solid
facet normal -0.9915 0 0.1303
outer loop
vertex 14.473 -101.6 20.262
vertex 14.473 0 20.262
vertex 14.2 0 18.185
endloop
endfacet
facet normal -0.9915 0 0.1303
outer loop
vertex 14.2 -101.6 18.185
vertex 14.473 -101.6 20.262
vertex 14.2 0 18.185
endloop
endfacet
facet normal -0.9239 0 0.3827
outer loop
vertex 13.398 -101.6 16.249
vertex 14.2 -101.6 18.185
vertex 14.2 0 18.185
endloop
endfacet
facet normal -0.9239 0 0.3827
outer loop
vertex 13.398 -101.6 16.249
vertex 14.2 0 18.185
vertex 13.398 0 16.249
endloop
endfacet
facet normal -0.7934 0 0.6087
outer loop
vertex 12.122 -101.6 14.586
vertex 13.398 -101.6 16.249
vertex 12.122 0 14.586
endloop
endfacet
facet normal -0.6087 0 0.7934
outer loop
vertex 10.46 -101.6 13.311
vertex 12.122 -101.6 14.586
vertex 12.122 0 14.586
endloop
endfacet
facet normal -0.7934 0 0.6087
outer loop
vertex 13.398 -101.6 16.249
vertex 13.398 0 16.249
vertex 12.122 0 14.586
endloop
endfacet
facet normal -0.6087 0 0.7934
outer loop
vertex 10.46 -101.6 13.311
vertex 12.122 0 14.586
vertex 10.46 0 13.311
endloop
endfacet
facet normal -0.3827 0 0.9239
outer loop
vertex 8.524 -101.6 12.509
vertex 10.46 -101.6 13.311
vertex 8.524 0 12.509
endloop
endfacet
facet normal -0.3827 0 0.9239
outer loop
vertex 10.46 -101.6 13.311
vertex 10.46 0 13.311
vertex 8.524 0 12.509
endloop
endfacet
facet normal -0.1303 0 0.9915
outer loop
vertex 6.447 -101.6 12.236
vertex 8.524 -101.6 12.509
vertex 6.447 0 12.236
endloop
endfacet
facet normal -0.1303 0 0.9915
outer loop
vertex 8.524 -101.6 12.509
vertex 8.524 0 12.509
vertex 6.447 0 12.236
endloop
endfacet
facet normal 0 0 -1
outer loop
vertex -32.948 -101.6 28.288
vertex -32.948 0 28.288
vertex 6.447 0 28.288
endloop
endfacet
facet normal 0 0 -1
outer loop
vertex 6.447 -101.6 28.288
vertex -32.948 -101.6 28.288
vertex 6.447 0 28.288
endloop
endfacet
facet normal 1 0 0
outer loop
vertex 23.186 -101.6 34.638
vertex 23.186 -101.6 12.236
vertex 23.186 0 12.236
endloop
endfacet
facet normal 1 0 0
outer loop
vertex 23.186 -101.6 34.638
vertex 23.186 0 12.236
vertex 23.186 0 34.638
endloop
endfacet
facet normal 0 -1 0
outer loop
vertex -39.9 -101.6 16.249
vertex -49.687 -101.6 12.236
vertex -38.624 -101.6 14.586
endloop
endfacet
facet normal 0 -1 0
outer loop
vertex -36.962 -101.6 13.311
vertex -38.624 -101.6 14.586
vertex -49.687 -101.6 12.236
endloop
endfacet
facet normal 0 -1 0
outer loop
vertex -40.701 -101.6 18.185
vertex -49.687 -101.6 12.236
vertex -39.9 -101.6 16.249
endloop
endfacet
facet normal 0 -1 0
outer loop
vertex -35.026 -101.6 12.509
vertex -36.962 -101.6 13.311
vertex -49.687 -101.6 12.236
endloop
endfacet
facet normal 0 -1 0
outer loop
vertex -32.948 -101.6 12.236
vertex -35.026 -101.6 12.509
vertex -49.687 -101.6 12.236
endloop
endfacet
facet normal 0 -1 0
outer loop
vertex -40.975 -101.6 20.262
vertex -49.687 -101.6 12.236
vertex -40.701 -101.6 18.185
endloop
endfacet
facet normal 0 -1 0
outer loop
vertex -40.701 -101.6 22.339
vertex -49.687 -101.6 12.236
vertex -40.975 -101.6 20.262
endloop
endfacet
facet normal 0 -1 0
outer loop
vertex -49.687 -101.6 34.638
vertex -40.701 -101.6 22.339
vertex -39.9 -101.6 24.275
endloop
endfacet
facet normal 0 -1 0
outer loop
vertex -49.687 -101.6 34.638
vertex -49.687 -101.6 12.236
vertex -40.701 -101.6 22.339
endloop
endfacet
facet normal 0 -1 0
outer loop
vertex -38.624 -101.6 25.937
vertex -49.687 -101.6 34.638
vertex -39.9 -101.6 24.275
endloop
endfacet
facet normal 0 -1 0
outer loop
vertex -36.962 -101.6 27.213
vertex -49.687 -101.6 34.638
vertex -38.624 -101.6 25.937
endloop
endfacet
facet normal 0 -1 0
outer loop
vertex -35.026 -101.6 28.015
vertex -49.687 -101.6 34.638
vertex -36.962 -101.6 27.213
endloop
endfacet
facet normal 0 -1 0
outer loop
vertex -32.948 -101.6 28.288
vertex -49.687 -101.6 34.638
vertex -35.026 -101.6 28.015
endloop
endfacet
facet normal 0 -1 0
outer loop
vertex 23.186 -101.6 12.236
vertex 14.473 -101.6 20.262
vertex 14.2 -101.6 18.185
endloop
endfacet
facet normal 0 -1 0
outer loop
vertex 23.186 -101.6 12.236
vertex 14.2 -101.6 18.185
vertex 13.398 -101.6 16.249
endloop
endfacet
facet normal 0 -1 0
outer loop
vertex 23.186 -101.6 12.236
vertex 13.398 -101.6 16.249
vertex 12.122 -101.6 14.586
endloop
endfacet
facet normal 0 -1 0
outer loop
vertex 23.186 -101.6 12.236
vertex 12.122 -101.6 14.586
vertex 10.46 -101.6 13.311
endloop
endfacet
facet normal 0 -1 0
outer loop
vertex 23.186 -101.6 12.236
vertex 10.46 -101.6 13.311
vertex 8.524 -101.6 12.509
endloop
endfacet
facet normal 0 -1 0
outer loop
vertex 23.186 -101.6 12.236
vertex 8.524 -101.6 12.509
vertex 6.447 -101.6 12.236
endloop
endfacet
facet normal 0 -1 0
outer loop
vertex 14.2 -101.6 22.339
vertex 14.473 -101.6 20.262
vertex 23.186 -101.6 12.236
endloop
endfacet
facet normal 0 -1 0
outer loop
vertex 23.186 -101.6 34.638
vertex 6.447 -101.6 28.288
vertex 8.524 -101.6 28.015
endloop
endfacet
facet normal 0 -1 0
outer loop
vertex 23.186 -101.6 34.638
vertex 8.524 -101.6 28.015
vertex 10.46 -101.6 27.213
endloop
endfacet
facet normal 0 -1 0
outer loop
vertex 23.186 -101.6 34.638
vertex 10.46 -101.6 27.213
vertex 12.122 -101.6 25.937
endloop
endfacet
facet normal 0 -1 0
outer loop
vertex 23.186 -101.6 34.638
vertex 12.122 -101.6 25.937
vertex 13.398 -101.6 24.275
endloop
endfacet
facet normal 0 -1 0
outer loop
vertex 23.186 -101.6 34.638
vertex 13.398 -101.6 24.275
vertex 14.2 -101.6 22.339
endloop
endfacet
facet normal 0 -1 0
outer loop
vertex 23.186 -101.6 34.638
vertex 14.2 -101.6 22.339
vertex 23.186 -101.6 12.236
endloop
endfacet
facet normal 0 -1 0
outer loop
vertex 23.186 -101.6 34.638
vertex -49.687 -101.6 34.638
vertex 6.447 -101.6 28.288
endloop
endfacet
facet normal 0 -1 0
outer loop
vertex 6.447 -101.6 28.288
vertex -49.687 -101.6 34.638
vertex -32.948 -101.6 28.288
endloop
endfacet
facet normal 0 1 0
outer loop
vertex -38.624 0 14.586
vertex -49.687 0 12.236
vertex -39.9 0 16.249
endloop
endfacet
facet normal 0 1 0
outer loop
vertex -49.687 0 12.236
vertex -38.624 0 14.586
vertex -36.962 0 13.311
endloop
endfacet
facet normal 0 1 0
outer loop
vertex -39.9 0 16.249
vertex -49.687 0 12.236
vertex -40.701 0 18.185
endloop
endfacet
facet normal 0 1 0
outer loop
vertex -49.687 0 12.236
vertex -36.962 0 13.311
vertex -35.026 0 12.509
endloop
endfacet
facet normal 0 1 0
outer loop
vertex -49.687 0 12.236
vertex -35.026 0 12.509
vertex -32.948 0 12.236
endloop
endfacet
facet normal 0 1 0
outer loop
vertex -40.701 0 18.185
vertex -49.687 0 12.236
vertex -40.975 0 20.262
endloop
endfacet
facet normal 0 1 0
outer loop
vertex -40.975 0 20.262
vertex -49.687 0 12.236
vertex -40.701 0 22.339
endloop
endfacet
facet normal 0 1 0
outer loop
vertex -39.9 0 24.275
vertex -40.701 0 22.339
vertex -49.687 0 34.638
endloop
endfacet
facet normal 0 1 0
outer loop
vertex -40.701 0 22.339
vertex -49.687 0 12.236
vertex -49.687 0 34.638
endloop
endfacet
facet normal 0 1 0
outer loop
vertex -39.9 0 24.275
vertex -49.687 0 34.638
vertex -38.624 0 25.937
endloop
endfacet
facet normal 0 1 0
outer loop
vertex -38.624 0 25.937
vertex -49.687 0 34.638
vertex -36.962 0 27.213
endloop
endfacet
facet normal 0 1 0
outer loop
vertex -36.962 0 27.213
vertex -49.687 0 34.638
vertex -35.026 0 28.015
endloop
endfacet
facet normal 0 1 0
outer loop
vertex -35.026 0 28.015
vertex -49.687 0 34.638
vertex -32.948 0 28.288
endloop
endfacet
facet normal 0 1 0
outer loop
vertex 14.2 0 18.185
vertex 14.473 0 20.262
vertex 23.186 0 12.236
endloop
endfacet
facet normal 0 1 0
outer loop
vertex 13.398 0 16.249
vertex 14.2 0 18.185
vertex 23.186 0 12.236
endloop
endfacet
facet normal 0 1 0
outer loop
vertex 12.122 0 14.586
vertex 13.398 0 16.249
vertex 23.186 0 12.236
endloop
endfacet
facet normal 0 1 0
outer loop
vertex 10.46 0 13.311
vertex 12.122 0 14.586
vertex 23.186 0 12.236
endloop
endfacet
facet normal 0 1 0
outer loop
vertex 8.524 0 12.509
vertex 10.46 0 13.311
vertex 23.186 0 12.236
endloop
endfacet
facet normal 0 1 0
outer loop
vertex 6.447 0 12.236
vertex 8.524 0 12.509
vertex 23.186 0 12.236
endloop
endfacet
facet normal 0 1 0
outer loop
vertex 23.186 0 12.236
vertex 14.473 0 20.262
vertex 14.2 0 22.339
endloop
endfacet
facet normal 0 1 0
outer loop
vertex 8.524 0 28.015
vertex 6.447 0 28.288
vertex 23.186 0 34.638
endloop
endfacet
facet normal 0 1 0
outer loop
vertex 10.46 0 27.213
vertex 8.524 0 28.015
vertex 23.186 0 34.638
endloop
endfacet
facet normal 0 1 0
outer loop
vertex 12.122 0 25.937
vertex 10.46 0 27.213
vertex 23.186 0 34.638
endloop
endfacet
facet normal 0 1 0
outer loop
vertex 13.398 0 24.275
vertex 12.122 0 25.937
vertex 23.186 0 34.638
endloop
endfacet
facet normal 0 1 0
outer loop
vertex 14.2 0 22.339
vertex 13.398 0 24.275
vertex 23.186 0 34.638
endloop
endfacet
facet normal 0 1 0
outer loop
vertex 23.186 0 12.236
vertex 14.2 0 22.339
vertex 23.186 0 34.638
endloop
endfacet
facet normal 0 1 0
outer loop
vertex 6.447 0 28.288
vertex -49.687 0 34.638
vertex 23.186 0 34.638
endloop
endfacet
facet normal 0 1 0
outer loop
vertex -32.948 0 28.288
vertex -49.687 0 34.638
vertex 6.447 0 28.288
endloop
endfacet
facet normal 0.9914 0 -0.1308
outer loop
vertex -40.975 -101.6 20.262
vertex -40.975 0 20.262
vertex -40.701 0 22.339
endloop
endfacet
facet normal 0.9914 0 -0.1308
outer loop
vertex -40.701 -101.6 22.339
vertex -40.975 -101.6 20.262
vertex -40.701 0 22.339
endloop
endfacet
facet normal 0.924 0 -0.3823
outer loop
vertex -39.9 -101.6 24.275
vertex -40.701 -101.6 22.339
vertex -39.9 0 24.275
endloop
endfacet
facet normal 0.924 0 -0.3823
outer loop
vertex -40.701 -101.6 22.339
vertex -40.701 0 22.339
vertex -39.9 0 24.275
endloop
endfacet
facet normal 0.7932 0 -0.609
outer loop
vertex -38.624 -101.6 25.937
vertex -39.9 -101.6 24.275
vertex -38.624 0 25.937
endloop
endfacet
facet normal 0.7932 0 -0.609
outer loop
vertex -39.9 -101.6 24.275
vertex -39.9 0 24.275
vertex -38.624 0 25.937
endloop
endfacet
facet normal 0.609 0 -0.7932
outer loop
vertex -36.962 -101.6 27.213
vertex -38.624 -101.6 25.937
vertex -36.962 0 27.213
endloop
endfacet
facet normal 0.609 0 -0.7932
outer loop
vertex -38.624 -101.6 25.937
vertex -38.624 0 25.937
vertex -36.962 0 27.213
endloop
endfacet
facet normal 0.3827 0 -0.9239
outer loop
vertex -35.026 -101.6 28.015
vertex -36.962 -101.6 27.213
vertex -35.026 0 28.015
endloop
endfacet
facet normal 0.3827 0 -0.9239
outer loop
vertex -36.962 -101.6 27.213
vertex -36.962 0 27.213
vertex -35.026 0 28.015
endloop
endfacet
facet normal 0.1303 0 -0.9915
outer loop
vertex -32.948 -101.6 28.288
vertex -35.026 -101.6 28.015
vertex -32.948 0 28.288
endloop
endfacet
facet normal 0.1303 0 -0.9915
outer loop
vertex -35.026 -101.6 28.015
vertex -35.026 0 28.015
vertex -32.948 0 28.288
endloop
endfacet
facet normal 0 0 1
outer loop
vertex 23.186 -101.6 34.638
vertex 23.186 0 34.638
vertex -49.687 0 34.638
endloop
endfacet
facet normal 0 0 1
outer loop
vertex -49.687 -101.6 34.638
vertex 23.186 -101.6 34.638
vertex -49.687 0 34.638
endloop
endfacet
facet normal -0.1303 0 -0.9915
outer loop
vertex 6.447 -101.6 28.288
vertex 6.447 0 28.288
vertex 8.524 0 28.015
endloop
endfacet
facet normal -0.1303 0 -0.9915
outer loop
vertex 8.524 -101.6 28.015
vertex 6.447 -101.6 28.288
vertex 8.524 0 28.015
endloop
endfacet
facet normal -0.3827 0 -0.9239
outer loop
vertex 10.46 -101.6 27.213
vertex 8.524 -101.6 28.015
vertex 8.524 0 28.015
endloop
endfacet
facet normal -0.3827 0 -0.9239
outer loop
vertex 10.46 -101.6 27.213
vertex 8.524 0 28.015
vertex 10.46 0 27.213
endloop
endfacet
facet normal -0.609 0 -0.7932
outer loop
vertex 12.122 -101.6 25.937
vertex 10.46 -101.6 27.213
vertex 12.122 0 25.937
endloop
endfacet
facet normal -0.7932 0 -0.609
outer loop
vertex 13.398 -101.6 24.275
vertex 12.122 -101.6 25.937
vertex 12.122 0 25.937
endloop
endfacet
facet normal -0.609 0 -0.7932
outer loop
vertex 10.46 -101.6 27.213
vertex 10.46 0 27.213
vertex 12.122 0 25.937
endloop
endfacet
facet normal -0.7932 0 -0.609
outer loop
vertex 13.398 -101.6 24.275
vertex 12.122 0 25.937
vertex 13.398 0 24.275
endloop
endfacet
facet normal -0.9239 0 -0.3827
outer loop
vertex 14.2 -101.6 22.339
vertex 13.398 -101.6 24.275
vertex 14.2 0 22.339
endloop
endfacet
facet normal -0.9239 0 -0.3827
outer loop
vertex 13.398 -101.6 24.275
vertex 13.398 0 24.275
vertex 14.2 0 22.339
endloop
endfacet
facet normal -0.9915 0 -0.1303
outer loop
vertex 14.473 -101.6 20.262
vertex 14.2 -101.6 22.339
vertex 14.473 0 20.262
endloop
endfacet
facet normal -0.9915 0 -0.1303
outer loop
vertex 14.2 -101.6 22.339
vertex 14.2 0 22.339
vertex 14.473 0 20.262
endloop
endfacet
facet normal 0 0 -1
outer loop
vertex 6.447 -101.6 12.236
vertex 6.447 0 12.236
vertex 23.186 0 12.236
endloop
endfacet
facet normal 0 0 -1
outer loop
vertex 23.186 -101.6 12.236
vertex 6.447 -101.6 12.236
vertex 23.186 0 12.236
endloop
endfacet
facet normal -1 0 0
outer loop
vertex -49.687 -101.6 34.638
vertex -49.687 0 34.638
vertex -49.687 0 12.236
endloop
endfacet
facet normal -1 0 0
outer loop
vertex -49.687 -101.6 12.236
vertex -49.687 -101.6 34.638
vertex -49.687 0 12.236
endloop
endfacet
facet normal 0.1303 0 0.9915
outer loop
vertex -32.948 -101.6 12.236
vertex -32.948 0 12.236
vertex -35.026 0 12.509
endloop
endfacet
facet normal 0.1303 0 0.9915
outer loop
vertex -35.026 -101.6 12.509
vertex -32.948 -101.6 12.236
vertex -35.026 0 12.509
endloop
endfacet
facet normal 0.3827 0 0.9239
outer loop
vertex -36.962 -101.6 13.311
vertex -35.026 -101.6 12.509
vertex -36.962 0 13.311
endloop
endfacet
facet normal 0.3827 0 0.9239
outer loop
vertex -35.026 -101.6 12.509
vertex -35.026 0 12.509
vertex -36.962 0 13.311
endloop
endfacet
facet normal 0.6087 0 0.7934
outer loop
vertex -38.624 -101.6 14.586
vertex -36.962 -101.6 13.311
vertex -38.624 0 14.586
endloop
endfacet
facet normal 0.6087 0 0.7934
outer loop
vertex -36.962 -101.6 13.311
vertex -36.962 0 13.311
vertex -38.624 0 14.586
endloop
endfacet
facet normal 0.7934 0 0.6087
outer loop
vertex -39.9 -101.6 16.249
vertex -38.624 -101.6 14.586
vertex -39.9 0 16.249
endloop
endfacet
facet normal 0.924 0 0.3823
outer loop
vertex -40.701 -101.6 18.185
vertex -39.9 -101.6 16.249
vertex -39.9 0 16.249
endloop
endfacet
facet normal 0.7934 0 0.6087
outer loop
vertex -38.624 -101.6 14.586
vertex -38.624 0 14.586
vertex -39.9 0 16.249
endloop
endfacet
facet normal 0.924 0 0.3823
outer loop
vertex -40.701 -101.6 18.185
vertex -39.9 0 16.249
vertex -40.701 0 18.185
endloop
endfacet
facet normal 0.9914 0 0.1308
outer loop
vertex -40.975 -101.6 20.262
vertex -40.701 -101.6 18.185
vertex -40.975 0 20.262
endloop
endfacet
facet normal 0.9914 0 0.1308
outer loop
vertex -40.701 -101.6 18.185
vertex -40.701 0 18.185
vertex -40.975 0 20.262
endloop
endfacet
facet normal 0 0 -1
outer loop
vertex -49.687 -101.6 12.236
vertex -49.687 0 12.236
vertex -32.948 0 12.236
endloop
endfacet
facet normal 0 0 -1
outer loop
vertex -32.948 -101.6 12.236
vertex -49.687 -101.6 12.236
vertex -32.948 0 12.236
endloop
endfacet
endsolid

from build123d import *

# Parameters (mm, degrees)
F1_DEPTH = 101.6


with BuildPart() as f1:
    # F0 (on Front) → F1 (new body)
    with BuildSketch(Plane.XZ):
        Polygon((23.185539, 34.638372), (-49.687061, 34.638372), (-49.687061, 28.288372), (-32.948462, 28.288372), (-23.702861, 28.288372), (-2.798661, 28.288372), (6.446939, 28.288372), (23.185539, 28.288372), align=None)
        with BuildLine():
            Line((-32.948462, 28.288372), (-49.687061, 28.288372))
            Line((-49.687061, 28.288372), (-49.687061, 20.261972))
            Line((-49.687061, 20.261972), (-40.974861, 20.261972))
            ThreePointArc((-40.974861, 20.261972), (-38.623983, 25.937493), (-32.948462, 28.288372))
        make_face()
        with BuildLine():
            Line((-40.974861, 20.261972), (-49.687061, 20.261972))
            Line((-49.687061, 20.261972), (-49.687061, 12.235572))
            Line((-49.687061, 12.235572), (-32.948461, 12.235572))
            ThreePointArc((-32.948461, 12.235572), (-38.623983, 14.58645), (-40.974861, 20.261972))
        make_face()
        with BuildLine():
            Line((23.185539, 20.261972), (23.185539, 28.288372))
            Line((23.185539, 28.288372), (6.446939, 28.288372))
            ThreePointArc((6.446939, 28.288372), (12.12246, 25.937493), (14.473339, 20.261972))
            Line((14.473339, 20.261972), (23.185539, 20.261972))
        make_face()
        with BuildLine():
            Line((23.185539, 12.235572), (23.185539, 20.261972))
            Line((23.185539, 20.261972), (14.473339, 20.261972))
            ThreePointArc((14.473339, 20.261972), (12.12246, 14.58645), (6.446939, 12.235572))
            Line((6.446939, 12.235572), (23.185539, 12.235572))
        make_face()
    extrude(amount=F1_DEPTH)


solid = f1.part
